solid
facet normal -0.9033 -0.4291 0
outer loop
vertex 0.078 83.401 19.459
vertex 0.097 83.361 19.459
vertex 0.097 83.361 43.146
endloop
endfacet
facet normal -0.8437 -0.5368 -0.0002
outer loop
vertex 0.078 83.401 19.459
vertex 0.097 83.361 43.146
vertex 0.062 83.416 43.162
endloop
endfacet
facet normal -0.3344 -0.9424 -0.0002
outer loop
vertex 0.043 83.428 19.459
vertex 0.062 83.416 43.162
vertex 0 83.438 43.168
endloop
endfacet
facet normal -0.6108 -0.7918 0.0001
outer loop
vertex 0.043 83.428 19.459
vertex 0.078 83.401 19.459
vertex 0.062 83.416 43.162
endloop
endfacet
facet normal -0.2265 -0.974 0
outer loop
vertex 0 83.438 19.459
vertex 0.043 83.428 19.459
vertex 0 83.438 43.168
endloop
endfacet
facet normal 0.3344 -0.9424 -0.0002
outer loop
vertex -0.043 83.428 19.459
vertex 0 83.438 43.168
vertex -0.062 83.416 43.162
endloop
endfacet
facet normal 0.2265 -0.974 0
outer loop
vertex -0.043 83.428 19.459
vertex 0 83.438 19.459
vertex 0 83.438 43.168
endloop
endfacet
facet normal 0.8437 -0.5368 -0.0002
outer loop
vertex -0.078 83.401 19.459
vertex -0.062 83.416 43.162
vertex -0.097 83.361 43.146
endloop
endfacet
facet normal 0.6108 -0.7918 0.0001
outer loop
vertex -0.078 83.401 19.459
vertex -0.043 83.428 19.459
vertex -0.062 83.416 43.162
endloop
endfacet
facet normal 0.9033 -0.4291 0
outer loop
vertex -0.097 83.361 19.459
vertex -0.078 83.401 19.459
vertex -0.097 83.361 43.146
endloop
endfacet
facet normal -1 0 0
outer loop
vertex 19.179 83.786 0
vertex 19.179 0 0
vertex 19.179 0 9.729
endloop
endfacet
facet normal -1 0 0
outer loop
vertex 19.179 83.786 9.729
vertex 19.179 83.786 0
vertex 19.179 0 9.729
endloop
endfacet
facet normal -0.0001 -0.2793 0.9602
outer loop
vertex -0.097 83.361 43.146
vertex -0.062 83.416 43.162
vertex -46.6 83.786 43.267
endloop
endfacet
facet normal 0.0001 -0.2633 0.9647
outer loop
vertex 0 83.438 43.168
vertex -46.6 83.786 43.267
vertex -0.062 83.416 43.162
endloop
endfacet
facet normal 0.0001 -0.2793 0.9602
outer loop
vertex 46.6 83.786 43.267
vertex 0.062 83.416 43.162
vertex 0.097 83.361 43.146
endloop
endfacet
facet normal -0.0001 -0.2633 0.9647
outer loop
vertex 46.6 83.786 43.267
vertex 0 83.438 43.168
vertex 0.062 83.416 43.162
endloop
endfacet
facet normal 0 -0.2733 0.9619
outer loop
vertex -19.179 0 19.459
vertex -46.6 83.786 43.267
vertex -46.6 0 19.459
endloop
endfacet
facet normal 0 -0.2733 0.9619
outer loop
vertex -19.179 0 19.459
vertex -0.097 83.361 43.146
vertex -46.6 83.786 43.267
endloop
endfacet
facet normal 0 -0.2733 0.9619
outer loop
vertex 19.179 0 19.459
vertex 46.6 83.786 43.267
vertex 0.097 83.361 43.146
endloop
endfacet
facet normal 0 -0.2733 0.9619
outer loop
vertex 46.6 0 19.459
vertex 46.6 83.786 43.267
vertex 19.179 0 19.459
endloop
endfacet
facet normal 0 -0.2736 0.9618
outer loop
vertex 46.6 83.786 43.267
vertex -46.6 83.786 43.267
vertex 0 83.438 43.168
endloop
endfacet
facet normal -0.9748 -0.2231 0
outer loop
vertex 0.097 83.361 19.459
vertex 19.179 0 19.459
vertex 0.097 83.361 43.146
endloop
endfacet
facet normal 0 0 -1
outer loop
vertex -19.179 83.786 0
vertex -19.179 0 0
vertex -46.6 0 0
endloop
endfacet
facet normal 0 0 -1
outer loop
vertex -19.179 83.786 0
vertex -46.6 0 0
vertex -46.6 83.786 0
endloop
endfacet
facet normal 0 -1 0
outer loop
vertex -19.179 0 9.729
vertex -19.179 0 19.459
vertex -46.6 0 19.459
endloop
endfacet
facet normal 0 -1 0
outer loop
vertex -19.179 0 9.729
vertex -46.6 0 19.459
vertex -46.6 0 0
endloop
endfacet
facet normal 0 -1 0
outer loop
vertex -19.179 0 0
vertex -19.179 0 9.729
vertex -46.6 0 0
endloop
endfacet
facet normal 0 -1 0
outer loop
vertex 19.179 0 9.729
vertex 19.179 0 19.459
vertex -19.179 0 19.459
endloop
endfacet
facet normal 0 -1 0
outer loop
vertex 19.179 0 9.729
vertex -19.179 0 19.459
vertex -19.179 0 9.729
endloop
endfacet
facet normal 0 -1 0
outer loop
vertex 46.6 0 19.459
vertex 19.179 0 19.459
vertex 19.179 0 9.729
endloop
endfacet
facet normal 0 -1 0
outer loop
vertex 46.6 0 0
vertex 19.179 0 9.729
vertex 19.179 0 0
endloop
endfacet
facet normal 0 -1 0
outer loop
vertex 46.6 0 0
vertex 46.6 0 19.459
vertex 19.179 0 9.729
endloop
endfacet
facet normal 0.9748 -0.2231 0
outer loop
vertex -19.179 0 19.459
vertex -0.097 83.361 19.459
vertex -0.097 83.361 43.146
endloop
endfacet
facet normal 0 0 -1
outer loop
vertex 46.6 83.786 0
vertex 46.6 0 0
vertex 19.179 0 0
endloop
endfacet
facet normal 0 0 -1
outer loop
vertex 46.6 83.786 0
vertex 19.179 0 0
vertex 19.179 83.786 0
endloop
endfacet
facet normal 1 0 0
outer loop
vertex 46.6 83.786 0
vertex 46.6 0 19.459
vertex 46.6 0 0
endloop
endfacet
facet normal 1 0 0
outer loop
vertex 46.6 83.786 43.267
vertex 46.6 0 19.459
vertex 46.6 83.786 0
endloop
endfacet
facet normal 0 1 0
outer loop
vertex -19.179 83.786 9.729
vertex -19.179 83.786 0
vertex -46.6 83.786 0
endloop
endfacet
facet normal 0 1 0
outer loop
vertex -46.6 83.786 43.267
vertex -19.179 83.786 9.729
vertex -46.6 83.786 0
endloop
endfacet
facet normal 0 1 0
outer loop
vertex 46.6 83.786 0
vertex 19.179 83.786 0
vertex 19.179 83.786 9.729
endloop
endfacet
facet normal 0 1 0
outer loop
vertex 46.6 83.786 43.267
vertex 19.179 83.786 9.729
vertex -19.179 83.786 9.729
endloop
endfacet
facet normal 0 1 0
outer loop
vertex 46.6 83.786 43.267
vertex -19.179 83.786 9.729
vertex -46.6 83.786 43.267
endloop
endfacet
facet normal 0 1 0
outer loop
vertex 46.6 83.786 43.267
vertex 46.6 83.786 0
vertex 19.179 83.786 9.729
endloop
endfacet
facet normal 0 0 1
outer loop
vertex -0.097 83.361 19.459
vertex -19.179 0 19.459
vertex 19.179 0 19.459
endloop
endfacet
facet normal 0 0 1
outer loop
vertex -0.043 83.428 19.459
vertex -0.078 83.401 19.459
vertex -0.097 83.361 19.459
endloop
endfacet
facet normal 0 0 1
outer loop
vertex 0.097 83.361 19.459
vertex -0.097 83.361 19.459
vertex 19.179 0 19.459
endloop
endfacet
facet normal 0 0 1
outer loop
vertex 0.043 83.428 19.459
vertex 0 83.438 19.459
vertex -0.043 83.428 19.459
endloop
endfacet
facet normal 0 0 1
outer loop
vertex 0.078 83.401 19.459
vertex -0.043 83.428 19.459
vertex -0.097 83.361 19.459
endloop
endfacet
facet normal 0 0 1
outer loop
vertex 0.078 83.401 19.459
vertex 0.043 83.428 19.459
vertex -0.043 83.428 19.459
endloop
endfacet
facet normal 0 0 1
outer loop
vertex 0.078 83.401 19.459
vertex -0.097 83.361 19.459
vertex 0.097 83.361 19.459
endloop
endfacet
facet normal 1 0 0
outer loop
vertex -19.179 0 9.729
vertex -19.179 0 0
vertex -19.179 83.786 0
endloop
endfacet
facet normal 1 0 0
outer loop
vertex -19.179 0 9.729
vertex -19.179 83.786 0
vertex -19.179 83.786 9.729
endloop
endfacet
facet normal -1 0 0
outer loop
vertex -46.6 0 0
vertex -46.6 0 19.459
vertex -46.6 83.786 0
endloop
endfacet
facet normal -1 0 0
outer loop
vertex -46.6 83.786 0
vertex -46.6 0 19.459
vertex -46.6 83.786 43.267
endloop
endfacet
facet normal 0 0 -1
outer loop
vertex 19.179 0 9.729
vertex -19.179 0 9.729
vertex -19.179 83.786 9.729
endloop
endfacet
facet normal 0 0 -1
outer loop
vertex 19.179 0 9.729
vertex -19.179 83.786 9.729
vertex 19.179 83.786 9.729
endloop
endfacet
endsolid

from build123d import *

# Parameters (mm, degrees)
F1_DEPTH = 46.6
F2_W     = 38.3587293327
F2_H     = 9.7292885184
F3_DEPTH = 83.7873460183
F6_DEPTH = 23.8091403077


with BuildPart() as f1:
    # F0 (on Right) → F1 (new body, symmetric)
    with BuildSketch(Plane.YZ):
        Polygon((0, 19.4585770369), (0, 0), (83.7863460183, 0), (83.7863460183, 43.2667173445), align=None)
    extrude(amount=F1_DEPTH, both=True)

    # F2 (on face) → F3 (cut, through all)
    with BuildSketch(Plane.XZ):
        with Locations((0, 4.8646442592)):
            Rectangle(F2_W, F2_H)
    extrude(amount=-F3_DEPTH, mode=Mode.SUBTRACT)

    # F5 (on plane+point) → F6 (cut, through all)
    with BuildSketch(Plane.XY.offset(19.4585770369)):
        with BuildLine():
            Line((-19.1793646663, 0), (19.1793646663, 0))
            Line((19.1793646663, 0), (0.097478719, 83.3605036706))
            ThreePointArc((0.097478719, 83.3605036706), (0, 83.4381900123), (-0.097478719, 83.3605036706))
            Line((-0.097478719, 83.3605036706), (-19.1793646663, 0))
        make_face()
    extrude(amount=F6_DEPTH, mode=Mode.SUBTRACT)


solid = f1.part
